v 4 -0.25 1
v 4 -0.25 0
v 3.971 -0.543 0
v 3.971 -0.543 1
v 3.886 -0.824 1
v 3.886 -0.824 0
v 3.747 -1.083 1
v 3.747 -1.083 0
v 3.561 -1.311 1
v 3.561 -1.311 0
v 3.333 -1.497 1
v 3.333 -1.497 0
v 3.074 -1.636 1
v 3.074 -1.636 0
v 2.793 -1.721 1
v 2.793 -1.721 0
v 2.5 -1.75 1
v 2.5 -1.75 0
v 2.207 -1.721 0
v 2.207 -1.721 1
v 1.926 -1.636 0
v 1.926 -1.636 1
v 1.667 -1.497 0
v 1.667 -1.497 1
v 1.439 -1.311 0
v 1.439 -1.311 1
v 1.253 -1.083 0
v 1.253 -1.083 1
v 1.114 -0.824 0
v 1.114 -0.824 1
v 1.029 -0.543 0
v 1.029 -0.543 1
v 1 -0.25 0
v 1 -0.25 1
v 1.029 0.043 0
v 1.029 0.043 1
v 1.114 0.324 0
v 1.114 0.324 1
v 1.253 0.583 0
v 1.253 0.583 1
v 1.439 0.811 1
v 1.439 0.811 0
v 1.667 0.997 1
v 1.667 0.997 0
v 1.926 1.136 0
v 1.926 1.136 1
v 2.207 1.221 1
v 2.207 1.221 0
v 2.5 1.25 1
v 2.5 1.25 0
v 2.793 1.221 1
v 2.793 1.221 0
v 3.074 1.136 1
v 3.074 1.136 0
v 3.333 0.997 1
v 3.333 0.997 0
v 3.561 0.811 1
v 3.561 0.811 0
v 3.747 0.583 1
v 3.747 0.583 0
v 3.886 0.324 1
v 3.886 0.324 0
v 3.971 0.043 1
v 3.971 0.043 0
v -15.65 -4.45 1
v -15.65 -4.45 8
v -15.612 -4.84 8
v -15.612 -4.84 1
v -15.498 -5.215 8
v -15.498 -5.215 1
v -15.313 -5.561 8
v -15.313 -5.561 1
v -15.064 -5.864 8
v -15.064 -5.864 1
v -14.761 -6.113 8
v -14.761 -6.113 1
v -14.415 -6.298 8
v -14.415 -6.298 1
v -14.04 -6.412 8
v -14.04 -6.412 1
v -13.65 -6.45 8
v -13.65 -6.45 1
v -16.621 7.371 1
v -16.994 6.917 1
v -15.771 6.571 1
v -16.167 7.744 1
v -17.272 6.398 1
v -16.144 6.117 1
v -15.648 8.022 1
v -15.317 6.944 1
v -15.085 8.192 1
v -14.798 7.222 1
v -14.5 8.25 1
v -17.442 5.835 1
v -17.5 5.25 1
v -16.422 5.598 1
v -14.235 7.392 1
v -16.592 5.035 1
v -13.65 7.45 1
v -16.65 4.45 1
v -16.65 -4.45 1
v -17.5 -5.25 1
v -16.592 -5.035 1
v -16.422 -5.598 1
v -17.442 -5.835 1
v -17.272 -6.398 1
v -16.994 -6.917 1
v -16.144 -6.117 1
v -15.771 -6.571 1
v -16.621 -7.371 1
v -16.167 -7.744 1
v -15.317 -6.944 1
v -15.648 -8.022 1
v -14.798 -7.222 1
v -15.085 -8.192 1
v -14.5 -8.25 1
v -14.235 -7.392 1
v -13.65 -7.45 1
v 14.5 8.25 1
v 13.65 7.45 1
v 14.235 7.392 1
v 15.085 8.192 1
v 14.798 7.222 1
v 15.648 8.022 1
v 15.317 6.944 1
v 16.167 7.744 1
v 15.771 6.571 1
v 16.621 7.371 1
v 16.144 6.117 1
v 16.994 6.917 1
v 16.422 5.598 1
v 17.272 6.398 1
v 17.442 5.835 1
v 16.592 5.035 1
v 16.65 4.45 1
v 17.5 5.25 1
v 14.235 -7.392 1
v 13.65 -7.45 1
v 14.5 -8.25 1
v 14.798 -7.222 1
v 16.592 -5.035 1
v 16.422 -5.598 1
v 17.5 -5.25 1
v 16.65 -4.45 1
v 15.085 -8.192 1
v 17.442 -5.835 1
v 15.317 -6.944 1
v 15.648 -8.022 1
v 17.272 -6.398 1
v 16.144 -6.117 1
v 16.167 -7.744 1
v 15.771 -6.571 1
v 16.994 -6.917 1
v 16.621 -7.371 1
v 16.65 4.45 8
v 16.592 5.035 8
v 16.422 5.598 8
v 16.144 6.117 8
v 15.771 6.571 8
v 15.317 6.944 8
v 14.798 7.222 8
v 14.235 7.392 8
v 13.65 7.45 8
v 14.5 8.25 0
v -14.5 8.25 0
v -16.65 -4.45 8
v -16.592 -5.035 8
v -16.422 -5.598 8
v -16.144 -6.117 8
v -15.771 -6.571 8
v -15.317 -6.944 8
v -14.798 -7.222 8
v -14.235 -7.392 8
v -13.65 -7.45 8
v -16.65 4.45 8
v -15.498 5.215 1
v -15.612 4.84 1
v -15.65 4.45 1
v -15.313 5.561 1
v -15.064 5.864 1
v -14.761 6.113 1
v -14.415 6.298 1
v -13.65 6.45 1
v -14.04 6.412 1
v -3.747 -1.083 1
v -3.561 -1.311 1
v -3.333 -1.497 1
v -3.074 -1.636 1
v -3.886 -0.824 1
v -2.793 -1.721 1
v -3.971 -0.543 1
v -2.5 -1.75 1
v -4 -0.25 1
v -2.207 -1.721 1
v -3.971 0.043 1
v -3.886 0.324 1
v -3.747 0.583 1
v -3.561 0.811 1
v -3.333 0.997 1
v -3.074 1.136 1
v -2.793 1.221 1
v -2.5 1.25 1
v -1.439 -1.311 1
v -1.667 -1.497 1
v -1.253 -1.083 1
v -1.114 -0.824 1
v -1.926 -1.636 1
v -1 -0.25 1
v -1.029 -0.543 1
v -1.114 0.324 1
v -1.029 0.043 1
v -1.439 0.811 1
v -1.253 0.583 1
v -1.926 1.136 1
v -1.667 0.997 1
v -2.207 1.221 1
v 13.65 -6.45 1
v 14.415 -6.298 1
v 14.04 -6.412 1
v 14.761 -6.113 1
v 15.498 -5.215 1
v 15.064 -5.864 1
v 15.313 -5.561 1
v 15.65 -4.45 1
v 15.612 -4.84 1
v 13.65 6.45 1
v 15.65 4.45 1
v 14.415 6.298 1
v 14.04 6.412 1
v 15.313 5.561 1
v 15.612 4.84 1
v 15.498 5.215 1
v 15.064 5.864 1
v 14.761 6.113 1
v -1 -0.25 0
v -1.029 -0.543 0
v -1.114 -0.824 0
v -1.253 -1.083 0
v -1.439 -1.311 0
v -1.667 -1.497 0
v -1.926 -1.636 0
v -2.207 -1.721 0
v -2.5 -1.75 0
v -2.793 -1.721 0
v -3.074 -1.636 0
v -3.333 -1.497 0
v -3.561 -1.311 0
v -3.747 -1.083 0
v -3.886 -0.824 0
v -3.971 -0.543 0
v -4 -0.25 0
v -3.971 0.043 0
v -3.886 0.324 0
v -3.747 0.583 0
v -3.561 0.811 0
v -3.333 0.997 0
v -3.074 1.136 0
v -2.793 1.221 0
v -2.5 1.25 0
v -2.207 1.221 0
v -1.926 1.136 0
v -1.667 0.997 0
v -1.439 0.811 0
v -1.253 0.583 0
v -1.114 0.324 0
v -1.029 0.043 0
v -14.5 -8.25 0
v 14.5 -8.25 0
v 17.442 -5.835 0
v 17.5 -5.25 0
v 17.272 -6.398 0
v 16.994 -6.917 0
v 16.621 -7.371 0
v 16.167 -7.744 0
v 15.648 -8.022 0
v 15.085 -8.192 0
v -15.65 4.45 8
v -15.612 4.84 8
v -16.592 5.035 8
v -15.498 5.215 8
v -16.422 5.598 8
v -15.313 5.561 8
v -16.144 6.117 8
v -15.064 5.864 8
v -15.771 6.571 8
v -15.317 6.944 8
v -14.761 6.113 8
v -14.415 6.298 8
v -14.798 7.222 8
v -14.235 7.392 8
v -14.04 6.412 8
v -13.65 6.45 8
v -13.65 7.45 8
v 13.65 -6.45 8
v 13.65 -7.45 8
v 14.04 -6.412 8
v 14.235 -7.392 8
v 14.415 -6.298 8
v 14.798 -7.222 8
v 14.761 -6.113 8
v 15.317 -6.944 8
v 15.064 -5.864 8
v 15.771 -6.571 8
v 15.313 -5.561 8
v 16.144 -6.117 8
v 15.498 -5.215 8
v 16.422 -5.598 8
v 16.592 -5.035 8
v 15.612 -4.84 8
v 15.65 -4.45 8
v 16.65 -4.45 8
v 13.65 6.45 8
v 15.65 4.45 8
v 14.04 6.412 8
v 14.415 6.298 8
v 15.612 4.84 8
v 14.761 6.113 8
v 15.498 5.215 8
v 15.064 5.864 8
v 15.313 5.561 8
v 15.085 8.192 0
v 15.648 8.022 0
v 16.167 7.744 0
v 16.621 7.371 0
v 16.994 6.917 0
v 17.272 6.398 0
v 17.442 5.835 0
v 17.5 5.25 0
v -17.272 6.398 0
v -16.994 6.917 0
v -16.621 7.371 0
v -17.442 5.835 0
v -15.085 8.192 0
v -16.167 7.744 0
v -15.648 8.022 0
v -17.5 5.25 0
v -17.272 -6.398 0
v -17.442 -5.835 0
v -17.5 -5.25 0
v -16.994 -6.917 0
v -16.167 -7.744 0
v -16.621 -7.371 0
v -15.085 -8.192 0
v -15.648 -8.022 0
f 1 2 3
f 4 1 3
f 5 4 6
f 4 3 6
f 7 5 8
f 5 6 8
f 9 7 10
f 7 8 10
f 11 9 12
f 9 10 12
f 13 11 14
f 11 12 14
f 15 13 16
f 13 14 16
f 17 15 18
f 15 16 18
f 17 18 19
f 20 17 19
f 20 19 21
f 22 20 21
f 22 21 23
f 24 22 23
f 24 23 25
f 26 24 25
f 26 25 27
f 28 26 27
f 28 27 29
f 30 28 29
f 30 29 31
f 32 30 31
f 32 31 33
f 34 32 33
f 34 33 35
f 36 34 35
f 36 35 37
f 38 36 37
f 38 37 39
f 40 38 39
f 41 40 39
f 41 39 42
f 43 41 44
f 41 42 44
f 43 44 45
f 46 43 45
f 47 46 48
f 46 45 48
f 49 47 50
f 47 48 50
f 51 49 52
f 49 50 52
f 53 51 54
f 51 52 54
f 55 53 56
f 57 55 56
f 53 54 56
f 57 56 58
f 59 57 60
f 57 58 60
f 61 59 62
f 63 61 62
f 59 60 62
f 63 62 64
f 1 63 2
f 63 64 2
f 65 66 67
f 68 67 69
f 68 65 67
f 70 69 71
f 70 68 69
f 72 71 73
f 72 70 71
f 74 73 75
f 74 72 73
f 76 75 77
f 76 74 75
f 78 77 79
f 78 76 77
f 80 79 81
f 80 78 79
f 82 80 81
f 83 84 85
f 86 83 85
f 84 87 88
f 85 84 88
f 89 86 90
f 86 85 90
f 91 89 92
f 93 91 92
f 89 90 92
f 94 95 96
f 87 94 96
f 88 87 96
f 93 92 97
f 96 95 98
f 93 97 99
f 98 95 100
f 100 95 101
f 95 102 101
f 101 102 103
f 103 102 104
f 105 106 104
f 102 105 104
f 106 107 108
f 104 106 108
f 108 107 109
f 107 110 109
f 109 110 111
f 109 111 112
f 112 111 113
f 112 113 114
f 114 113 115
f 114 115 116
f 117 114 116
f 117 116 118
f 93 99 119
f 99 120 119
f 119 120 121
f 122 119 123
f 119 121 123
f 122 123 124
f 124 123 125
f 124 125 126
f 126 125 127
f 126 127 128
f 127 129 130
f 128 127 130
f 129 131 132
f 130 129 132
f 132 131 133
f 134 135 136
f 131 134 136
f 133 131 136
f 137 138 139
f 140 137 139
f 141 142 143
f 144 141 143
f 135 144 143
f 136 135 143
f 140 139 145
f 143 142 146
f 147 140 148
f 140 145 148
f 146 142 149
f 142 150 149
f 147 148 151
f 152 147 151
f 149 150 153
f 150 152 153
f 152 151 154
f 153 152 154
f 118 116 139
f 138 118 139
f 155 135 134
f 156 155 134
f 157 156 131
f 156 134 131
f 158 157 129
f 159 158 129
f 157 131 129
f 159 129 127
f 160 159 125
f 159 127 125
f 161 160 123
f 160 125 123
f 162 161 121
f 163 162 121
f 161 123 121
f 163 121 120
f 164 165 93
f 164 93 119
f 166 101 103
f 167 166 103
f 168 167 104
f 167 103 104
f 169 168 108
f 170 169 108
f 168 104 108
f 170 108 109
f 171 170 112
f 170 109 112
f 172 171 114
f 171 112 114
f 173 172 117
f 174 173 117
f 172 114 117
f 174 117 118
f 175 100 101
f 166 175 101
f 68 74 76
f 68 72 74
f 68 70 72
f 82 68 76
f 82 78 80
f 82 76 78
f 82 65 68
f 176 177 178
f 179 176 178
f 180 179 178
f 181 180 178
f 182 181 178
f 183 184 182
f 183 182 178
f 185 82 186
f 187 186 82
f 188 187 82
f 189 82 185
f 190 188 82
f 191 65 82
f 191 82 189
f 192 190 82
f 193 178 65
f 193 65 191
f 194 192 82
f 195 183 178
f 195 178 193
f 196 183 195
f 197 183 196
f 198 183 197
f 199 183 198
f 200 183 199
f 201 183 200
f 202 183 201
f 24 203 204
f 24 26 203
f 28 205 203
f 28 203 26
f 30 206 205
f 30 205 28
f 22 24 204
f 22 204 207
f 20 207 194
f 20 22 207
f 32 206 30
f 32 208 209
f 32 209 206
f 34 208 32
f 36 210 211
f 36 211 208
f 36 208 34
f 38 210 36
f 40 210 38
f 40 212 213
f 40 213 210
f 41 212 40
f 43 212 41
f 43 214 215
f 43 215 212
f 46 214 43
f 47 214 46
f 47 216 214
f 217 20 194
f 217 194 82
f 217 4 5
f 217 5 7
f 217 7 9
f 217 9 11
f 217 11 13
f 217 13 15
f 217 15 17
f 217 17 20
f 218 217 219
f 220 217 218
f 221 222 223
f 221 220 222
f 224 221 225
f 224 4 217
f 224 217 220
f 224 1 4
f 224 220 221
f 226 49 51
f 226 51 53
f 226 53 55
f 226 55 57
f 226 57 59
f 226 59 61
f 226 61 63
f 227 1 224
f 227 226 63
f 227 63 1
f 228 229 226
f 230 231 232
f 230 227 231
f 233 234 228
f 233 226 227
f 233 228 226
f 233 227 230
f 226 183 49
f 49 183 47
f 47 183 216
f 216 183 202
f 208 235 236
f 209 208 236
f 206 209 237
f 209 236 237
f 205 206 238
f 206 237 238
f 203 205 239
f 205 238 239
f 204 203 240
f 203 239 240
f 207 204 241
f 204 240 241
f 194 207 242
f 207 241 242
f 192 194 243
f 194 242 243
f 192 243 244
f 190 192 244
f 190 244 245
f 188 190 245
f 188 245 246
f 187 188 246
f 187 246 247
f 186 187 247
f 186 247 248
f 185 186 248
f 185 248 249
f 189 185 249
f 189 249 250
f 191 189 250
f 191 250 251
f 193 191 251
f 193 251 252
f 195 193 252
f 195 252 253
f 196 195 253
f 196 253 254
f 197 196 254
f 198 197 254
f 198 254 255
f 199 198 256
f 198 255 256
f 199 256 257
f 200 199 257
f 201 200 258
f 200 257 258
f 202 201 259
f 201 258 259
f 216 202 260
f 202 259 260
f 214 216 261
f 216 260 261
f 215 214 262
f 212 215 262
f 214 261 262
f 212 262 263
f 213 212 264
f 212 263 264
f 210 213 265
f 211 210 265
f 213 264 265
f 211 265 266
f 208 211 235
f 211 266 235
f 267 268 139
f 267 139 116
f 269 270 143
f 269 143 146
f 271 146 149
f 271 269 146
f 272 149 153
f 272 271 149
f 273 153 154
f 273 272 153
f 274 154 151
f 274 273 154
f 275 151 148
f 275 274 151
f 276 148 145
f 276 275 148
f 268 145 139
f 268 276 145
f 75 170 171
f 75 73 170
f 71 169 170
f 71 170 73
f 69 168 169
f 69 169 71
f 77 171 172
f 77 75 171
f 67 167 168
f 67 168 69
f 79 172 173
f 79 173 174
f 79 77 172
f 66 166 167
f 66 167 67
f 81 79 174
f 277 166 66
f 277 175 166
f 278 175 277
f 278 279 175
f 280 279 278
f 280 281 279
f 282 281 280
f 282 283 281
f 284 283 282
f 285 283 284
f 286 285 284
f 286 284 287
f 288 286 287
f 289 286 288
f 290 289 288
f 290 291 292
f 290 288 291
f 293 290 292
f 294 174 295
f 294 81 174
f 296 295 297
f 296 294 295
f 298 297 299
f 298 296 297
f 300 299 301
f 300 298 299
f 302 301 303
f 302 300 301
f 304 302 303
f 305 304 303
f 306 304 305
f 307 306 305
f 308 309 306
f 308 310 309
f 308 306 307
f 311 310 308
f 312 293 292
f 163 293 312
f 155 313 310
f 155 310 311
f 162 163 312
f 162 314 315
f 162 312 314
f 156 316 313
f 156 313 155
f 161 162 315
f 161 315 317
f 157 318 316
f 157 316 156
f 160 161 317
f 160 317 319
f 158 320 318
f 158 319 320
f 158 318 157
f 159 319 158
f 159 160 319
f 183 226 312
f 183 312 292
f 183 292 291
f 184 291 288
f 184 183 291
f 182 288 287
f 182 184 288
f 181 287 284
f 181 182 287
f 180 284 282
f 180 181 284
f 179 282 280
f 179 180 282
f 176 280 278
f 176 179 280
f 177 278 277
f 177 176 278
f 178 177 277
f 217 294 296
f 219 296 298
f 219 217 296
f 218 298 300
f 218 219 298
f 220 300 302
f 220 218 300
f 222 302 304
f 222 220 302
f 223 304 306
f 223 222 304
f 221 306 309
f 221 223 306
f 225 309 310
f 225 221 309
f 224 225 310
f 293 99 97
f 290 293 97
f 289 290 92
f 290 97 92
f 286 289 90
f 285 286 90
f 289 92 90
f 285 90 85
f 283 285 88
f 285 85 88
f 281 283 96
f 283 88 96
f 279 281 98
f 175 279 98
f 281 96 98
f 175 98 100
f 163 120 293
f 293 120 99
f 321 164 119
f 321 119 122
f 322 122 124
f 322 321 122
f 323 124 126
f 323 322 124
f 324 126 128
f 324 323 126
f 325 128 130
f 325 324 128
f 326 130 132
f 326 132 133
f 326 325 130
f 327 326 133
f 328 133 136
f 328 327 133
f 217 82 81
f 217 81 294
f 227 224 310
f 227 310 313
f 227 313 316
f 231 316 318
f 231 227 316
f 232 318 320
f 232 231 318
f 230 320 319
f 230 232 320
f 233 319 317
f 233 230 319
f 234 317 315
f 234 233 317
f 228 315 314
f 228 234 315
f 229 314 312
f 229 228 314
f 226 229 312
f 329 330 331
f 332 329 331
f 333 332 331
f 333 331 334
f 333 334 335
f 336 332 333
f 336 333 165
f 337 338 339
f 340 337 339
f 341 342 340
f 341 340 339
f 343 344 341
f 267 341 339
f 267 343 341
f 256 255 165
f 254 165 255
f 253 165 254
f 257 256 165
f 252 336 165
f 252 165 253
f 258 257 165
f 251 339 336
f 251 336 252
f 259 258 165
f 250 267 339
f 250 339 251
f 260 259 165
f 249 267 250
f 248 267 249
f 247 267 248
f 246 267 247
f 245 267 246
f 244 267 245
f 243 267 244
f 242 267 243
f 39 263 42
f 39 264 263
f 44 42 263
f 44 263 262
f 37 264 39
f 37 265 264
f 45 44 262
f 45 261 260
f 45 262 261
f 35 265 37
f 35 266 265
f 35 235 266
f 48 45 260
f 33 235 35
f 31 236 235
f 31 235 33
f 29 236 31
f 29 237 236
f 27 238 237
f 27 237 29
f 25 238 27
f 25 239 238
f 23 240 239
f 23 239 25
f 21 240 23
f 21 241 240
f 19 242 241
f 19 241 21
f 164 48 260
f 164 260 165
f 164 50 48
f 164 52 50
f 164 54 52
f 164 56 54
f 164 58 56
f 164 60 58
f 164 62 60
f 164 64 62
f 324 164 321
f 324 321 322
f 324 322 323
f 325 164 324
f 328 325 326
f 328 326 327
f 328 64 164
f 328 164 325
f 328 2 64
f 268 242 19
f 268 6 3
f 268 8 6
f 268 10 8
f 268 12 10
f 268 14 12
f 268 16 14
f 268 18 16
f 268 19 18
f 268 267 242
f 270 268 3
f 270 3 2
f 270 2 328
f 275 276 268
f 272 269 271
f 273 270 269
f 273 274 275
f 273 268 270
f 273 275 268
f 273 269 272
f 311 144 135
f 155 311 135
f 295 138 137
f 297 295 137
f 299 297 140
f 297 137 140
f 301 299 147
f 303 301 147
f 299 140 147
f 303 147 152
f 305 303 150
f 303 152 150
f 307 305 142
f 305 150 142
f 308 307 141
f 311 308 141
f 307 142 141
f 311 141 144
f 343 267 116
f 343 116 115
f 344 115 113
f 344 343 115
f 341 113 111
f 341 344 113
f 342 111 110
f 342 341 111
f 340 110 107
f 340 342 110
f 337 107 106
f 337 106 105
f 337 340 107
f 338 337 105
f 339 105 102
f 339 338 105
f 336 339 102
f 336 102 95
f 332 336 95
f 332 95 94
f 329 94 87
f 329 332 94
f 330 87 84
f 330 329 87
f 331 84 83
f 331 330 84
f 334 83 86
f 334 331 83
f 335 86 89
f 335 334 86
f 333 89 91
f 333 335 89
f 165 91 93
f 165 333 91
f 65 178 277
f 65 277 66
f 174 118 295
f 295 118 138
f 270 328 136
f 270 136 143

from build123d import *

# Parameters (mm, degrees)
F1_DEPTH = 8
F2_T     = -1
F4_DEPTH = 1
F6_R     = 1.5
F7_DEPTH = 8.001


with BuildPart() as f1:
    # F0 (on Top) → F1 (new body)
    with BuildSketch(Plane.XY):
        with BuildLine():
            Line((-13.65, -7.45), (13.65, -7.45))
            ThreePointArc((13.65, -7.45), (15.77132, -6.57132), (16.65, -4.45))
            Line((16.65, -4.45), (16.65, 4.45))
            ThreePointArc((16.65, 4.45), (15.77132, 6.57132), (13.65, 7.45))
            Line((13.65, 7.45), (-13.65, 7.45))
            ThreePointArc((-13.65, 7.45), (-15.77132, 6.57132), (-16.65, 4.45))
            Line((-16.65, 4.45), (-16.65, -4.45))
            ThreePointArc((-16.65, -4.45), (-15.77132, -6.57132), (-13.65, -7.45))
        make_face()
    extrude(amount=F1_DEPTH)

    # F2
    f2_openings = [f1.faces().sort_by_distance(p)[0] for p in [
        (0, 0, 8),
    ]]
    offset(amount=F2_T, openings=f2_openings)


with BuildPart() as f4:
    # F3 (on face) → F4 (new body)
    with BuildSketch(Plane(origin=(0, 0, 0), x_dir=(1, 0, 0), z_dir=(0, 0, -1))):
        with BuildLine():
            Line((-14.5, -8.25), (14.5, -8.25))
            ThreePointArc((14.5, -8.25), (16.62132, -7.37132), (17.5, -5.25))
            Line((17.5, -5.25), (17.5, 5.25))
            ThreePointArc((17.5, 5.25), (16.62132, 7.37132), (14.5, 8.25))
            Line((14.5, 8.25), (-14.5, 8.25))
            ThreePointArc((-14.5, 8.25), (-16.62132, 7.37132), (-17.5, 5.25))
            Line((-17.5, 5.25), (-17.5, -5.25))
            ThreePointArc((-17.5, -5.25), (-16.62132, -7.37132), (-14.5, -8.25))
        make_face()
        with BuildLine():
            Line((-13.65, 7.45), (13.65, 7.45))
            ThreePointArc((13.65, 7.45), (15.77132, 6.57132), (16.65, 4.45))
            Line((16.65, 4.45), (16.65, -4.45))
            ThreePointArc((16.65, -4.45), (15.77132, -6.57132), (13.65, -7.45))
            Line((13.65, -7.45), (-13.65, -7.45))
            ThreePointArc((-13.65, -7.45), (-15.77132, -6.57132), (-16.65, -4.45))
            Line((-16.65, -4.45), (-16.65, 4.45))
            ThreePointArc((-16.65, 4.45), (-15.77132, 6.57132), (-13.65, 7.45))
        make_face(mode=Mode.SUBTRACT)
    extrude(amount=-F4_DEPTH)


with BuildPart() as f1_1:
    add(f1.part)

    # F5: union F4
    add(f4.part)

    # F6 (on face) → F7 (cut, through all)
    with BuildSketch(Plane(origin=(0, 0, 0), x_dir=(1, 0, 0), z_dir=(0, 0, -1))):
        with Locations((-2.5, 0.25)):
            Circle(F6_R)
        with Locations((2.5, 0.25)):
            Circle(F6_R)
    extrude(amount=-F7_DEPTH, mode=Mode.SUBTRACT)


solid = f1_1.part
